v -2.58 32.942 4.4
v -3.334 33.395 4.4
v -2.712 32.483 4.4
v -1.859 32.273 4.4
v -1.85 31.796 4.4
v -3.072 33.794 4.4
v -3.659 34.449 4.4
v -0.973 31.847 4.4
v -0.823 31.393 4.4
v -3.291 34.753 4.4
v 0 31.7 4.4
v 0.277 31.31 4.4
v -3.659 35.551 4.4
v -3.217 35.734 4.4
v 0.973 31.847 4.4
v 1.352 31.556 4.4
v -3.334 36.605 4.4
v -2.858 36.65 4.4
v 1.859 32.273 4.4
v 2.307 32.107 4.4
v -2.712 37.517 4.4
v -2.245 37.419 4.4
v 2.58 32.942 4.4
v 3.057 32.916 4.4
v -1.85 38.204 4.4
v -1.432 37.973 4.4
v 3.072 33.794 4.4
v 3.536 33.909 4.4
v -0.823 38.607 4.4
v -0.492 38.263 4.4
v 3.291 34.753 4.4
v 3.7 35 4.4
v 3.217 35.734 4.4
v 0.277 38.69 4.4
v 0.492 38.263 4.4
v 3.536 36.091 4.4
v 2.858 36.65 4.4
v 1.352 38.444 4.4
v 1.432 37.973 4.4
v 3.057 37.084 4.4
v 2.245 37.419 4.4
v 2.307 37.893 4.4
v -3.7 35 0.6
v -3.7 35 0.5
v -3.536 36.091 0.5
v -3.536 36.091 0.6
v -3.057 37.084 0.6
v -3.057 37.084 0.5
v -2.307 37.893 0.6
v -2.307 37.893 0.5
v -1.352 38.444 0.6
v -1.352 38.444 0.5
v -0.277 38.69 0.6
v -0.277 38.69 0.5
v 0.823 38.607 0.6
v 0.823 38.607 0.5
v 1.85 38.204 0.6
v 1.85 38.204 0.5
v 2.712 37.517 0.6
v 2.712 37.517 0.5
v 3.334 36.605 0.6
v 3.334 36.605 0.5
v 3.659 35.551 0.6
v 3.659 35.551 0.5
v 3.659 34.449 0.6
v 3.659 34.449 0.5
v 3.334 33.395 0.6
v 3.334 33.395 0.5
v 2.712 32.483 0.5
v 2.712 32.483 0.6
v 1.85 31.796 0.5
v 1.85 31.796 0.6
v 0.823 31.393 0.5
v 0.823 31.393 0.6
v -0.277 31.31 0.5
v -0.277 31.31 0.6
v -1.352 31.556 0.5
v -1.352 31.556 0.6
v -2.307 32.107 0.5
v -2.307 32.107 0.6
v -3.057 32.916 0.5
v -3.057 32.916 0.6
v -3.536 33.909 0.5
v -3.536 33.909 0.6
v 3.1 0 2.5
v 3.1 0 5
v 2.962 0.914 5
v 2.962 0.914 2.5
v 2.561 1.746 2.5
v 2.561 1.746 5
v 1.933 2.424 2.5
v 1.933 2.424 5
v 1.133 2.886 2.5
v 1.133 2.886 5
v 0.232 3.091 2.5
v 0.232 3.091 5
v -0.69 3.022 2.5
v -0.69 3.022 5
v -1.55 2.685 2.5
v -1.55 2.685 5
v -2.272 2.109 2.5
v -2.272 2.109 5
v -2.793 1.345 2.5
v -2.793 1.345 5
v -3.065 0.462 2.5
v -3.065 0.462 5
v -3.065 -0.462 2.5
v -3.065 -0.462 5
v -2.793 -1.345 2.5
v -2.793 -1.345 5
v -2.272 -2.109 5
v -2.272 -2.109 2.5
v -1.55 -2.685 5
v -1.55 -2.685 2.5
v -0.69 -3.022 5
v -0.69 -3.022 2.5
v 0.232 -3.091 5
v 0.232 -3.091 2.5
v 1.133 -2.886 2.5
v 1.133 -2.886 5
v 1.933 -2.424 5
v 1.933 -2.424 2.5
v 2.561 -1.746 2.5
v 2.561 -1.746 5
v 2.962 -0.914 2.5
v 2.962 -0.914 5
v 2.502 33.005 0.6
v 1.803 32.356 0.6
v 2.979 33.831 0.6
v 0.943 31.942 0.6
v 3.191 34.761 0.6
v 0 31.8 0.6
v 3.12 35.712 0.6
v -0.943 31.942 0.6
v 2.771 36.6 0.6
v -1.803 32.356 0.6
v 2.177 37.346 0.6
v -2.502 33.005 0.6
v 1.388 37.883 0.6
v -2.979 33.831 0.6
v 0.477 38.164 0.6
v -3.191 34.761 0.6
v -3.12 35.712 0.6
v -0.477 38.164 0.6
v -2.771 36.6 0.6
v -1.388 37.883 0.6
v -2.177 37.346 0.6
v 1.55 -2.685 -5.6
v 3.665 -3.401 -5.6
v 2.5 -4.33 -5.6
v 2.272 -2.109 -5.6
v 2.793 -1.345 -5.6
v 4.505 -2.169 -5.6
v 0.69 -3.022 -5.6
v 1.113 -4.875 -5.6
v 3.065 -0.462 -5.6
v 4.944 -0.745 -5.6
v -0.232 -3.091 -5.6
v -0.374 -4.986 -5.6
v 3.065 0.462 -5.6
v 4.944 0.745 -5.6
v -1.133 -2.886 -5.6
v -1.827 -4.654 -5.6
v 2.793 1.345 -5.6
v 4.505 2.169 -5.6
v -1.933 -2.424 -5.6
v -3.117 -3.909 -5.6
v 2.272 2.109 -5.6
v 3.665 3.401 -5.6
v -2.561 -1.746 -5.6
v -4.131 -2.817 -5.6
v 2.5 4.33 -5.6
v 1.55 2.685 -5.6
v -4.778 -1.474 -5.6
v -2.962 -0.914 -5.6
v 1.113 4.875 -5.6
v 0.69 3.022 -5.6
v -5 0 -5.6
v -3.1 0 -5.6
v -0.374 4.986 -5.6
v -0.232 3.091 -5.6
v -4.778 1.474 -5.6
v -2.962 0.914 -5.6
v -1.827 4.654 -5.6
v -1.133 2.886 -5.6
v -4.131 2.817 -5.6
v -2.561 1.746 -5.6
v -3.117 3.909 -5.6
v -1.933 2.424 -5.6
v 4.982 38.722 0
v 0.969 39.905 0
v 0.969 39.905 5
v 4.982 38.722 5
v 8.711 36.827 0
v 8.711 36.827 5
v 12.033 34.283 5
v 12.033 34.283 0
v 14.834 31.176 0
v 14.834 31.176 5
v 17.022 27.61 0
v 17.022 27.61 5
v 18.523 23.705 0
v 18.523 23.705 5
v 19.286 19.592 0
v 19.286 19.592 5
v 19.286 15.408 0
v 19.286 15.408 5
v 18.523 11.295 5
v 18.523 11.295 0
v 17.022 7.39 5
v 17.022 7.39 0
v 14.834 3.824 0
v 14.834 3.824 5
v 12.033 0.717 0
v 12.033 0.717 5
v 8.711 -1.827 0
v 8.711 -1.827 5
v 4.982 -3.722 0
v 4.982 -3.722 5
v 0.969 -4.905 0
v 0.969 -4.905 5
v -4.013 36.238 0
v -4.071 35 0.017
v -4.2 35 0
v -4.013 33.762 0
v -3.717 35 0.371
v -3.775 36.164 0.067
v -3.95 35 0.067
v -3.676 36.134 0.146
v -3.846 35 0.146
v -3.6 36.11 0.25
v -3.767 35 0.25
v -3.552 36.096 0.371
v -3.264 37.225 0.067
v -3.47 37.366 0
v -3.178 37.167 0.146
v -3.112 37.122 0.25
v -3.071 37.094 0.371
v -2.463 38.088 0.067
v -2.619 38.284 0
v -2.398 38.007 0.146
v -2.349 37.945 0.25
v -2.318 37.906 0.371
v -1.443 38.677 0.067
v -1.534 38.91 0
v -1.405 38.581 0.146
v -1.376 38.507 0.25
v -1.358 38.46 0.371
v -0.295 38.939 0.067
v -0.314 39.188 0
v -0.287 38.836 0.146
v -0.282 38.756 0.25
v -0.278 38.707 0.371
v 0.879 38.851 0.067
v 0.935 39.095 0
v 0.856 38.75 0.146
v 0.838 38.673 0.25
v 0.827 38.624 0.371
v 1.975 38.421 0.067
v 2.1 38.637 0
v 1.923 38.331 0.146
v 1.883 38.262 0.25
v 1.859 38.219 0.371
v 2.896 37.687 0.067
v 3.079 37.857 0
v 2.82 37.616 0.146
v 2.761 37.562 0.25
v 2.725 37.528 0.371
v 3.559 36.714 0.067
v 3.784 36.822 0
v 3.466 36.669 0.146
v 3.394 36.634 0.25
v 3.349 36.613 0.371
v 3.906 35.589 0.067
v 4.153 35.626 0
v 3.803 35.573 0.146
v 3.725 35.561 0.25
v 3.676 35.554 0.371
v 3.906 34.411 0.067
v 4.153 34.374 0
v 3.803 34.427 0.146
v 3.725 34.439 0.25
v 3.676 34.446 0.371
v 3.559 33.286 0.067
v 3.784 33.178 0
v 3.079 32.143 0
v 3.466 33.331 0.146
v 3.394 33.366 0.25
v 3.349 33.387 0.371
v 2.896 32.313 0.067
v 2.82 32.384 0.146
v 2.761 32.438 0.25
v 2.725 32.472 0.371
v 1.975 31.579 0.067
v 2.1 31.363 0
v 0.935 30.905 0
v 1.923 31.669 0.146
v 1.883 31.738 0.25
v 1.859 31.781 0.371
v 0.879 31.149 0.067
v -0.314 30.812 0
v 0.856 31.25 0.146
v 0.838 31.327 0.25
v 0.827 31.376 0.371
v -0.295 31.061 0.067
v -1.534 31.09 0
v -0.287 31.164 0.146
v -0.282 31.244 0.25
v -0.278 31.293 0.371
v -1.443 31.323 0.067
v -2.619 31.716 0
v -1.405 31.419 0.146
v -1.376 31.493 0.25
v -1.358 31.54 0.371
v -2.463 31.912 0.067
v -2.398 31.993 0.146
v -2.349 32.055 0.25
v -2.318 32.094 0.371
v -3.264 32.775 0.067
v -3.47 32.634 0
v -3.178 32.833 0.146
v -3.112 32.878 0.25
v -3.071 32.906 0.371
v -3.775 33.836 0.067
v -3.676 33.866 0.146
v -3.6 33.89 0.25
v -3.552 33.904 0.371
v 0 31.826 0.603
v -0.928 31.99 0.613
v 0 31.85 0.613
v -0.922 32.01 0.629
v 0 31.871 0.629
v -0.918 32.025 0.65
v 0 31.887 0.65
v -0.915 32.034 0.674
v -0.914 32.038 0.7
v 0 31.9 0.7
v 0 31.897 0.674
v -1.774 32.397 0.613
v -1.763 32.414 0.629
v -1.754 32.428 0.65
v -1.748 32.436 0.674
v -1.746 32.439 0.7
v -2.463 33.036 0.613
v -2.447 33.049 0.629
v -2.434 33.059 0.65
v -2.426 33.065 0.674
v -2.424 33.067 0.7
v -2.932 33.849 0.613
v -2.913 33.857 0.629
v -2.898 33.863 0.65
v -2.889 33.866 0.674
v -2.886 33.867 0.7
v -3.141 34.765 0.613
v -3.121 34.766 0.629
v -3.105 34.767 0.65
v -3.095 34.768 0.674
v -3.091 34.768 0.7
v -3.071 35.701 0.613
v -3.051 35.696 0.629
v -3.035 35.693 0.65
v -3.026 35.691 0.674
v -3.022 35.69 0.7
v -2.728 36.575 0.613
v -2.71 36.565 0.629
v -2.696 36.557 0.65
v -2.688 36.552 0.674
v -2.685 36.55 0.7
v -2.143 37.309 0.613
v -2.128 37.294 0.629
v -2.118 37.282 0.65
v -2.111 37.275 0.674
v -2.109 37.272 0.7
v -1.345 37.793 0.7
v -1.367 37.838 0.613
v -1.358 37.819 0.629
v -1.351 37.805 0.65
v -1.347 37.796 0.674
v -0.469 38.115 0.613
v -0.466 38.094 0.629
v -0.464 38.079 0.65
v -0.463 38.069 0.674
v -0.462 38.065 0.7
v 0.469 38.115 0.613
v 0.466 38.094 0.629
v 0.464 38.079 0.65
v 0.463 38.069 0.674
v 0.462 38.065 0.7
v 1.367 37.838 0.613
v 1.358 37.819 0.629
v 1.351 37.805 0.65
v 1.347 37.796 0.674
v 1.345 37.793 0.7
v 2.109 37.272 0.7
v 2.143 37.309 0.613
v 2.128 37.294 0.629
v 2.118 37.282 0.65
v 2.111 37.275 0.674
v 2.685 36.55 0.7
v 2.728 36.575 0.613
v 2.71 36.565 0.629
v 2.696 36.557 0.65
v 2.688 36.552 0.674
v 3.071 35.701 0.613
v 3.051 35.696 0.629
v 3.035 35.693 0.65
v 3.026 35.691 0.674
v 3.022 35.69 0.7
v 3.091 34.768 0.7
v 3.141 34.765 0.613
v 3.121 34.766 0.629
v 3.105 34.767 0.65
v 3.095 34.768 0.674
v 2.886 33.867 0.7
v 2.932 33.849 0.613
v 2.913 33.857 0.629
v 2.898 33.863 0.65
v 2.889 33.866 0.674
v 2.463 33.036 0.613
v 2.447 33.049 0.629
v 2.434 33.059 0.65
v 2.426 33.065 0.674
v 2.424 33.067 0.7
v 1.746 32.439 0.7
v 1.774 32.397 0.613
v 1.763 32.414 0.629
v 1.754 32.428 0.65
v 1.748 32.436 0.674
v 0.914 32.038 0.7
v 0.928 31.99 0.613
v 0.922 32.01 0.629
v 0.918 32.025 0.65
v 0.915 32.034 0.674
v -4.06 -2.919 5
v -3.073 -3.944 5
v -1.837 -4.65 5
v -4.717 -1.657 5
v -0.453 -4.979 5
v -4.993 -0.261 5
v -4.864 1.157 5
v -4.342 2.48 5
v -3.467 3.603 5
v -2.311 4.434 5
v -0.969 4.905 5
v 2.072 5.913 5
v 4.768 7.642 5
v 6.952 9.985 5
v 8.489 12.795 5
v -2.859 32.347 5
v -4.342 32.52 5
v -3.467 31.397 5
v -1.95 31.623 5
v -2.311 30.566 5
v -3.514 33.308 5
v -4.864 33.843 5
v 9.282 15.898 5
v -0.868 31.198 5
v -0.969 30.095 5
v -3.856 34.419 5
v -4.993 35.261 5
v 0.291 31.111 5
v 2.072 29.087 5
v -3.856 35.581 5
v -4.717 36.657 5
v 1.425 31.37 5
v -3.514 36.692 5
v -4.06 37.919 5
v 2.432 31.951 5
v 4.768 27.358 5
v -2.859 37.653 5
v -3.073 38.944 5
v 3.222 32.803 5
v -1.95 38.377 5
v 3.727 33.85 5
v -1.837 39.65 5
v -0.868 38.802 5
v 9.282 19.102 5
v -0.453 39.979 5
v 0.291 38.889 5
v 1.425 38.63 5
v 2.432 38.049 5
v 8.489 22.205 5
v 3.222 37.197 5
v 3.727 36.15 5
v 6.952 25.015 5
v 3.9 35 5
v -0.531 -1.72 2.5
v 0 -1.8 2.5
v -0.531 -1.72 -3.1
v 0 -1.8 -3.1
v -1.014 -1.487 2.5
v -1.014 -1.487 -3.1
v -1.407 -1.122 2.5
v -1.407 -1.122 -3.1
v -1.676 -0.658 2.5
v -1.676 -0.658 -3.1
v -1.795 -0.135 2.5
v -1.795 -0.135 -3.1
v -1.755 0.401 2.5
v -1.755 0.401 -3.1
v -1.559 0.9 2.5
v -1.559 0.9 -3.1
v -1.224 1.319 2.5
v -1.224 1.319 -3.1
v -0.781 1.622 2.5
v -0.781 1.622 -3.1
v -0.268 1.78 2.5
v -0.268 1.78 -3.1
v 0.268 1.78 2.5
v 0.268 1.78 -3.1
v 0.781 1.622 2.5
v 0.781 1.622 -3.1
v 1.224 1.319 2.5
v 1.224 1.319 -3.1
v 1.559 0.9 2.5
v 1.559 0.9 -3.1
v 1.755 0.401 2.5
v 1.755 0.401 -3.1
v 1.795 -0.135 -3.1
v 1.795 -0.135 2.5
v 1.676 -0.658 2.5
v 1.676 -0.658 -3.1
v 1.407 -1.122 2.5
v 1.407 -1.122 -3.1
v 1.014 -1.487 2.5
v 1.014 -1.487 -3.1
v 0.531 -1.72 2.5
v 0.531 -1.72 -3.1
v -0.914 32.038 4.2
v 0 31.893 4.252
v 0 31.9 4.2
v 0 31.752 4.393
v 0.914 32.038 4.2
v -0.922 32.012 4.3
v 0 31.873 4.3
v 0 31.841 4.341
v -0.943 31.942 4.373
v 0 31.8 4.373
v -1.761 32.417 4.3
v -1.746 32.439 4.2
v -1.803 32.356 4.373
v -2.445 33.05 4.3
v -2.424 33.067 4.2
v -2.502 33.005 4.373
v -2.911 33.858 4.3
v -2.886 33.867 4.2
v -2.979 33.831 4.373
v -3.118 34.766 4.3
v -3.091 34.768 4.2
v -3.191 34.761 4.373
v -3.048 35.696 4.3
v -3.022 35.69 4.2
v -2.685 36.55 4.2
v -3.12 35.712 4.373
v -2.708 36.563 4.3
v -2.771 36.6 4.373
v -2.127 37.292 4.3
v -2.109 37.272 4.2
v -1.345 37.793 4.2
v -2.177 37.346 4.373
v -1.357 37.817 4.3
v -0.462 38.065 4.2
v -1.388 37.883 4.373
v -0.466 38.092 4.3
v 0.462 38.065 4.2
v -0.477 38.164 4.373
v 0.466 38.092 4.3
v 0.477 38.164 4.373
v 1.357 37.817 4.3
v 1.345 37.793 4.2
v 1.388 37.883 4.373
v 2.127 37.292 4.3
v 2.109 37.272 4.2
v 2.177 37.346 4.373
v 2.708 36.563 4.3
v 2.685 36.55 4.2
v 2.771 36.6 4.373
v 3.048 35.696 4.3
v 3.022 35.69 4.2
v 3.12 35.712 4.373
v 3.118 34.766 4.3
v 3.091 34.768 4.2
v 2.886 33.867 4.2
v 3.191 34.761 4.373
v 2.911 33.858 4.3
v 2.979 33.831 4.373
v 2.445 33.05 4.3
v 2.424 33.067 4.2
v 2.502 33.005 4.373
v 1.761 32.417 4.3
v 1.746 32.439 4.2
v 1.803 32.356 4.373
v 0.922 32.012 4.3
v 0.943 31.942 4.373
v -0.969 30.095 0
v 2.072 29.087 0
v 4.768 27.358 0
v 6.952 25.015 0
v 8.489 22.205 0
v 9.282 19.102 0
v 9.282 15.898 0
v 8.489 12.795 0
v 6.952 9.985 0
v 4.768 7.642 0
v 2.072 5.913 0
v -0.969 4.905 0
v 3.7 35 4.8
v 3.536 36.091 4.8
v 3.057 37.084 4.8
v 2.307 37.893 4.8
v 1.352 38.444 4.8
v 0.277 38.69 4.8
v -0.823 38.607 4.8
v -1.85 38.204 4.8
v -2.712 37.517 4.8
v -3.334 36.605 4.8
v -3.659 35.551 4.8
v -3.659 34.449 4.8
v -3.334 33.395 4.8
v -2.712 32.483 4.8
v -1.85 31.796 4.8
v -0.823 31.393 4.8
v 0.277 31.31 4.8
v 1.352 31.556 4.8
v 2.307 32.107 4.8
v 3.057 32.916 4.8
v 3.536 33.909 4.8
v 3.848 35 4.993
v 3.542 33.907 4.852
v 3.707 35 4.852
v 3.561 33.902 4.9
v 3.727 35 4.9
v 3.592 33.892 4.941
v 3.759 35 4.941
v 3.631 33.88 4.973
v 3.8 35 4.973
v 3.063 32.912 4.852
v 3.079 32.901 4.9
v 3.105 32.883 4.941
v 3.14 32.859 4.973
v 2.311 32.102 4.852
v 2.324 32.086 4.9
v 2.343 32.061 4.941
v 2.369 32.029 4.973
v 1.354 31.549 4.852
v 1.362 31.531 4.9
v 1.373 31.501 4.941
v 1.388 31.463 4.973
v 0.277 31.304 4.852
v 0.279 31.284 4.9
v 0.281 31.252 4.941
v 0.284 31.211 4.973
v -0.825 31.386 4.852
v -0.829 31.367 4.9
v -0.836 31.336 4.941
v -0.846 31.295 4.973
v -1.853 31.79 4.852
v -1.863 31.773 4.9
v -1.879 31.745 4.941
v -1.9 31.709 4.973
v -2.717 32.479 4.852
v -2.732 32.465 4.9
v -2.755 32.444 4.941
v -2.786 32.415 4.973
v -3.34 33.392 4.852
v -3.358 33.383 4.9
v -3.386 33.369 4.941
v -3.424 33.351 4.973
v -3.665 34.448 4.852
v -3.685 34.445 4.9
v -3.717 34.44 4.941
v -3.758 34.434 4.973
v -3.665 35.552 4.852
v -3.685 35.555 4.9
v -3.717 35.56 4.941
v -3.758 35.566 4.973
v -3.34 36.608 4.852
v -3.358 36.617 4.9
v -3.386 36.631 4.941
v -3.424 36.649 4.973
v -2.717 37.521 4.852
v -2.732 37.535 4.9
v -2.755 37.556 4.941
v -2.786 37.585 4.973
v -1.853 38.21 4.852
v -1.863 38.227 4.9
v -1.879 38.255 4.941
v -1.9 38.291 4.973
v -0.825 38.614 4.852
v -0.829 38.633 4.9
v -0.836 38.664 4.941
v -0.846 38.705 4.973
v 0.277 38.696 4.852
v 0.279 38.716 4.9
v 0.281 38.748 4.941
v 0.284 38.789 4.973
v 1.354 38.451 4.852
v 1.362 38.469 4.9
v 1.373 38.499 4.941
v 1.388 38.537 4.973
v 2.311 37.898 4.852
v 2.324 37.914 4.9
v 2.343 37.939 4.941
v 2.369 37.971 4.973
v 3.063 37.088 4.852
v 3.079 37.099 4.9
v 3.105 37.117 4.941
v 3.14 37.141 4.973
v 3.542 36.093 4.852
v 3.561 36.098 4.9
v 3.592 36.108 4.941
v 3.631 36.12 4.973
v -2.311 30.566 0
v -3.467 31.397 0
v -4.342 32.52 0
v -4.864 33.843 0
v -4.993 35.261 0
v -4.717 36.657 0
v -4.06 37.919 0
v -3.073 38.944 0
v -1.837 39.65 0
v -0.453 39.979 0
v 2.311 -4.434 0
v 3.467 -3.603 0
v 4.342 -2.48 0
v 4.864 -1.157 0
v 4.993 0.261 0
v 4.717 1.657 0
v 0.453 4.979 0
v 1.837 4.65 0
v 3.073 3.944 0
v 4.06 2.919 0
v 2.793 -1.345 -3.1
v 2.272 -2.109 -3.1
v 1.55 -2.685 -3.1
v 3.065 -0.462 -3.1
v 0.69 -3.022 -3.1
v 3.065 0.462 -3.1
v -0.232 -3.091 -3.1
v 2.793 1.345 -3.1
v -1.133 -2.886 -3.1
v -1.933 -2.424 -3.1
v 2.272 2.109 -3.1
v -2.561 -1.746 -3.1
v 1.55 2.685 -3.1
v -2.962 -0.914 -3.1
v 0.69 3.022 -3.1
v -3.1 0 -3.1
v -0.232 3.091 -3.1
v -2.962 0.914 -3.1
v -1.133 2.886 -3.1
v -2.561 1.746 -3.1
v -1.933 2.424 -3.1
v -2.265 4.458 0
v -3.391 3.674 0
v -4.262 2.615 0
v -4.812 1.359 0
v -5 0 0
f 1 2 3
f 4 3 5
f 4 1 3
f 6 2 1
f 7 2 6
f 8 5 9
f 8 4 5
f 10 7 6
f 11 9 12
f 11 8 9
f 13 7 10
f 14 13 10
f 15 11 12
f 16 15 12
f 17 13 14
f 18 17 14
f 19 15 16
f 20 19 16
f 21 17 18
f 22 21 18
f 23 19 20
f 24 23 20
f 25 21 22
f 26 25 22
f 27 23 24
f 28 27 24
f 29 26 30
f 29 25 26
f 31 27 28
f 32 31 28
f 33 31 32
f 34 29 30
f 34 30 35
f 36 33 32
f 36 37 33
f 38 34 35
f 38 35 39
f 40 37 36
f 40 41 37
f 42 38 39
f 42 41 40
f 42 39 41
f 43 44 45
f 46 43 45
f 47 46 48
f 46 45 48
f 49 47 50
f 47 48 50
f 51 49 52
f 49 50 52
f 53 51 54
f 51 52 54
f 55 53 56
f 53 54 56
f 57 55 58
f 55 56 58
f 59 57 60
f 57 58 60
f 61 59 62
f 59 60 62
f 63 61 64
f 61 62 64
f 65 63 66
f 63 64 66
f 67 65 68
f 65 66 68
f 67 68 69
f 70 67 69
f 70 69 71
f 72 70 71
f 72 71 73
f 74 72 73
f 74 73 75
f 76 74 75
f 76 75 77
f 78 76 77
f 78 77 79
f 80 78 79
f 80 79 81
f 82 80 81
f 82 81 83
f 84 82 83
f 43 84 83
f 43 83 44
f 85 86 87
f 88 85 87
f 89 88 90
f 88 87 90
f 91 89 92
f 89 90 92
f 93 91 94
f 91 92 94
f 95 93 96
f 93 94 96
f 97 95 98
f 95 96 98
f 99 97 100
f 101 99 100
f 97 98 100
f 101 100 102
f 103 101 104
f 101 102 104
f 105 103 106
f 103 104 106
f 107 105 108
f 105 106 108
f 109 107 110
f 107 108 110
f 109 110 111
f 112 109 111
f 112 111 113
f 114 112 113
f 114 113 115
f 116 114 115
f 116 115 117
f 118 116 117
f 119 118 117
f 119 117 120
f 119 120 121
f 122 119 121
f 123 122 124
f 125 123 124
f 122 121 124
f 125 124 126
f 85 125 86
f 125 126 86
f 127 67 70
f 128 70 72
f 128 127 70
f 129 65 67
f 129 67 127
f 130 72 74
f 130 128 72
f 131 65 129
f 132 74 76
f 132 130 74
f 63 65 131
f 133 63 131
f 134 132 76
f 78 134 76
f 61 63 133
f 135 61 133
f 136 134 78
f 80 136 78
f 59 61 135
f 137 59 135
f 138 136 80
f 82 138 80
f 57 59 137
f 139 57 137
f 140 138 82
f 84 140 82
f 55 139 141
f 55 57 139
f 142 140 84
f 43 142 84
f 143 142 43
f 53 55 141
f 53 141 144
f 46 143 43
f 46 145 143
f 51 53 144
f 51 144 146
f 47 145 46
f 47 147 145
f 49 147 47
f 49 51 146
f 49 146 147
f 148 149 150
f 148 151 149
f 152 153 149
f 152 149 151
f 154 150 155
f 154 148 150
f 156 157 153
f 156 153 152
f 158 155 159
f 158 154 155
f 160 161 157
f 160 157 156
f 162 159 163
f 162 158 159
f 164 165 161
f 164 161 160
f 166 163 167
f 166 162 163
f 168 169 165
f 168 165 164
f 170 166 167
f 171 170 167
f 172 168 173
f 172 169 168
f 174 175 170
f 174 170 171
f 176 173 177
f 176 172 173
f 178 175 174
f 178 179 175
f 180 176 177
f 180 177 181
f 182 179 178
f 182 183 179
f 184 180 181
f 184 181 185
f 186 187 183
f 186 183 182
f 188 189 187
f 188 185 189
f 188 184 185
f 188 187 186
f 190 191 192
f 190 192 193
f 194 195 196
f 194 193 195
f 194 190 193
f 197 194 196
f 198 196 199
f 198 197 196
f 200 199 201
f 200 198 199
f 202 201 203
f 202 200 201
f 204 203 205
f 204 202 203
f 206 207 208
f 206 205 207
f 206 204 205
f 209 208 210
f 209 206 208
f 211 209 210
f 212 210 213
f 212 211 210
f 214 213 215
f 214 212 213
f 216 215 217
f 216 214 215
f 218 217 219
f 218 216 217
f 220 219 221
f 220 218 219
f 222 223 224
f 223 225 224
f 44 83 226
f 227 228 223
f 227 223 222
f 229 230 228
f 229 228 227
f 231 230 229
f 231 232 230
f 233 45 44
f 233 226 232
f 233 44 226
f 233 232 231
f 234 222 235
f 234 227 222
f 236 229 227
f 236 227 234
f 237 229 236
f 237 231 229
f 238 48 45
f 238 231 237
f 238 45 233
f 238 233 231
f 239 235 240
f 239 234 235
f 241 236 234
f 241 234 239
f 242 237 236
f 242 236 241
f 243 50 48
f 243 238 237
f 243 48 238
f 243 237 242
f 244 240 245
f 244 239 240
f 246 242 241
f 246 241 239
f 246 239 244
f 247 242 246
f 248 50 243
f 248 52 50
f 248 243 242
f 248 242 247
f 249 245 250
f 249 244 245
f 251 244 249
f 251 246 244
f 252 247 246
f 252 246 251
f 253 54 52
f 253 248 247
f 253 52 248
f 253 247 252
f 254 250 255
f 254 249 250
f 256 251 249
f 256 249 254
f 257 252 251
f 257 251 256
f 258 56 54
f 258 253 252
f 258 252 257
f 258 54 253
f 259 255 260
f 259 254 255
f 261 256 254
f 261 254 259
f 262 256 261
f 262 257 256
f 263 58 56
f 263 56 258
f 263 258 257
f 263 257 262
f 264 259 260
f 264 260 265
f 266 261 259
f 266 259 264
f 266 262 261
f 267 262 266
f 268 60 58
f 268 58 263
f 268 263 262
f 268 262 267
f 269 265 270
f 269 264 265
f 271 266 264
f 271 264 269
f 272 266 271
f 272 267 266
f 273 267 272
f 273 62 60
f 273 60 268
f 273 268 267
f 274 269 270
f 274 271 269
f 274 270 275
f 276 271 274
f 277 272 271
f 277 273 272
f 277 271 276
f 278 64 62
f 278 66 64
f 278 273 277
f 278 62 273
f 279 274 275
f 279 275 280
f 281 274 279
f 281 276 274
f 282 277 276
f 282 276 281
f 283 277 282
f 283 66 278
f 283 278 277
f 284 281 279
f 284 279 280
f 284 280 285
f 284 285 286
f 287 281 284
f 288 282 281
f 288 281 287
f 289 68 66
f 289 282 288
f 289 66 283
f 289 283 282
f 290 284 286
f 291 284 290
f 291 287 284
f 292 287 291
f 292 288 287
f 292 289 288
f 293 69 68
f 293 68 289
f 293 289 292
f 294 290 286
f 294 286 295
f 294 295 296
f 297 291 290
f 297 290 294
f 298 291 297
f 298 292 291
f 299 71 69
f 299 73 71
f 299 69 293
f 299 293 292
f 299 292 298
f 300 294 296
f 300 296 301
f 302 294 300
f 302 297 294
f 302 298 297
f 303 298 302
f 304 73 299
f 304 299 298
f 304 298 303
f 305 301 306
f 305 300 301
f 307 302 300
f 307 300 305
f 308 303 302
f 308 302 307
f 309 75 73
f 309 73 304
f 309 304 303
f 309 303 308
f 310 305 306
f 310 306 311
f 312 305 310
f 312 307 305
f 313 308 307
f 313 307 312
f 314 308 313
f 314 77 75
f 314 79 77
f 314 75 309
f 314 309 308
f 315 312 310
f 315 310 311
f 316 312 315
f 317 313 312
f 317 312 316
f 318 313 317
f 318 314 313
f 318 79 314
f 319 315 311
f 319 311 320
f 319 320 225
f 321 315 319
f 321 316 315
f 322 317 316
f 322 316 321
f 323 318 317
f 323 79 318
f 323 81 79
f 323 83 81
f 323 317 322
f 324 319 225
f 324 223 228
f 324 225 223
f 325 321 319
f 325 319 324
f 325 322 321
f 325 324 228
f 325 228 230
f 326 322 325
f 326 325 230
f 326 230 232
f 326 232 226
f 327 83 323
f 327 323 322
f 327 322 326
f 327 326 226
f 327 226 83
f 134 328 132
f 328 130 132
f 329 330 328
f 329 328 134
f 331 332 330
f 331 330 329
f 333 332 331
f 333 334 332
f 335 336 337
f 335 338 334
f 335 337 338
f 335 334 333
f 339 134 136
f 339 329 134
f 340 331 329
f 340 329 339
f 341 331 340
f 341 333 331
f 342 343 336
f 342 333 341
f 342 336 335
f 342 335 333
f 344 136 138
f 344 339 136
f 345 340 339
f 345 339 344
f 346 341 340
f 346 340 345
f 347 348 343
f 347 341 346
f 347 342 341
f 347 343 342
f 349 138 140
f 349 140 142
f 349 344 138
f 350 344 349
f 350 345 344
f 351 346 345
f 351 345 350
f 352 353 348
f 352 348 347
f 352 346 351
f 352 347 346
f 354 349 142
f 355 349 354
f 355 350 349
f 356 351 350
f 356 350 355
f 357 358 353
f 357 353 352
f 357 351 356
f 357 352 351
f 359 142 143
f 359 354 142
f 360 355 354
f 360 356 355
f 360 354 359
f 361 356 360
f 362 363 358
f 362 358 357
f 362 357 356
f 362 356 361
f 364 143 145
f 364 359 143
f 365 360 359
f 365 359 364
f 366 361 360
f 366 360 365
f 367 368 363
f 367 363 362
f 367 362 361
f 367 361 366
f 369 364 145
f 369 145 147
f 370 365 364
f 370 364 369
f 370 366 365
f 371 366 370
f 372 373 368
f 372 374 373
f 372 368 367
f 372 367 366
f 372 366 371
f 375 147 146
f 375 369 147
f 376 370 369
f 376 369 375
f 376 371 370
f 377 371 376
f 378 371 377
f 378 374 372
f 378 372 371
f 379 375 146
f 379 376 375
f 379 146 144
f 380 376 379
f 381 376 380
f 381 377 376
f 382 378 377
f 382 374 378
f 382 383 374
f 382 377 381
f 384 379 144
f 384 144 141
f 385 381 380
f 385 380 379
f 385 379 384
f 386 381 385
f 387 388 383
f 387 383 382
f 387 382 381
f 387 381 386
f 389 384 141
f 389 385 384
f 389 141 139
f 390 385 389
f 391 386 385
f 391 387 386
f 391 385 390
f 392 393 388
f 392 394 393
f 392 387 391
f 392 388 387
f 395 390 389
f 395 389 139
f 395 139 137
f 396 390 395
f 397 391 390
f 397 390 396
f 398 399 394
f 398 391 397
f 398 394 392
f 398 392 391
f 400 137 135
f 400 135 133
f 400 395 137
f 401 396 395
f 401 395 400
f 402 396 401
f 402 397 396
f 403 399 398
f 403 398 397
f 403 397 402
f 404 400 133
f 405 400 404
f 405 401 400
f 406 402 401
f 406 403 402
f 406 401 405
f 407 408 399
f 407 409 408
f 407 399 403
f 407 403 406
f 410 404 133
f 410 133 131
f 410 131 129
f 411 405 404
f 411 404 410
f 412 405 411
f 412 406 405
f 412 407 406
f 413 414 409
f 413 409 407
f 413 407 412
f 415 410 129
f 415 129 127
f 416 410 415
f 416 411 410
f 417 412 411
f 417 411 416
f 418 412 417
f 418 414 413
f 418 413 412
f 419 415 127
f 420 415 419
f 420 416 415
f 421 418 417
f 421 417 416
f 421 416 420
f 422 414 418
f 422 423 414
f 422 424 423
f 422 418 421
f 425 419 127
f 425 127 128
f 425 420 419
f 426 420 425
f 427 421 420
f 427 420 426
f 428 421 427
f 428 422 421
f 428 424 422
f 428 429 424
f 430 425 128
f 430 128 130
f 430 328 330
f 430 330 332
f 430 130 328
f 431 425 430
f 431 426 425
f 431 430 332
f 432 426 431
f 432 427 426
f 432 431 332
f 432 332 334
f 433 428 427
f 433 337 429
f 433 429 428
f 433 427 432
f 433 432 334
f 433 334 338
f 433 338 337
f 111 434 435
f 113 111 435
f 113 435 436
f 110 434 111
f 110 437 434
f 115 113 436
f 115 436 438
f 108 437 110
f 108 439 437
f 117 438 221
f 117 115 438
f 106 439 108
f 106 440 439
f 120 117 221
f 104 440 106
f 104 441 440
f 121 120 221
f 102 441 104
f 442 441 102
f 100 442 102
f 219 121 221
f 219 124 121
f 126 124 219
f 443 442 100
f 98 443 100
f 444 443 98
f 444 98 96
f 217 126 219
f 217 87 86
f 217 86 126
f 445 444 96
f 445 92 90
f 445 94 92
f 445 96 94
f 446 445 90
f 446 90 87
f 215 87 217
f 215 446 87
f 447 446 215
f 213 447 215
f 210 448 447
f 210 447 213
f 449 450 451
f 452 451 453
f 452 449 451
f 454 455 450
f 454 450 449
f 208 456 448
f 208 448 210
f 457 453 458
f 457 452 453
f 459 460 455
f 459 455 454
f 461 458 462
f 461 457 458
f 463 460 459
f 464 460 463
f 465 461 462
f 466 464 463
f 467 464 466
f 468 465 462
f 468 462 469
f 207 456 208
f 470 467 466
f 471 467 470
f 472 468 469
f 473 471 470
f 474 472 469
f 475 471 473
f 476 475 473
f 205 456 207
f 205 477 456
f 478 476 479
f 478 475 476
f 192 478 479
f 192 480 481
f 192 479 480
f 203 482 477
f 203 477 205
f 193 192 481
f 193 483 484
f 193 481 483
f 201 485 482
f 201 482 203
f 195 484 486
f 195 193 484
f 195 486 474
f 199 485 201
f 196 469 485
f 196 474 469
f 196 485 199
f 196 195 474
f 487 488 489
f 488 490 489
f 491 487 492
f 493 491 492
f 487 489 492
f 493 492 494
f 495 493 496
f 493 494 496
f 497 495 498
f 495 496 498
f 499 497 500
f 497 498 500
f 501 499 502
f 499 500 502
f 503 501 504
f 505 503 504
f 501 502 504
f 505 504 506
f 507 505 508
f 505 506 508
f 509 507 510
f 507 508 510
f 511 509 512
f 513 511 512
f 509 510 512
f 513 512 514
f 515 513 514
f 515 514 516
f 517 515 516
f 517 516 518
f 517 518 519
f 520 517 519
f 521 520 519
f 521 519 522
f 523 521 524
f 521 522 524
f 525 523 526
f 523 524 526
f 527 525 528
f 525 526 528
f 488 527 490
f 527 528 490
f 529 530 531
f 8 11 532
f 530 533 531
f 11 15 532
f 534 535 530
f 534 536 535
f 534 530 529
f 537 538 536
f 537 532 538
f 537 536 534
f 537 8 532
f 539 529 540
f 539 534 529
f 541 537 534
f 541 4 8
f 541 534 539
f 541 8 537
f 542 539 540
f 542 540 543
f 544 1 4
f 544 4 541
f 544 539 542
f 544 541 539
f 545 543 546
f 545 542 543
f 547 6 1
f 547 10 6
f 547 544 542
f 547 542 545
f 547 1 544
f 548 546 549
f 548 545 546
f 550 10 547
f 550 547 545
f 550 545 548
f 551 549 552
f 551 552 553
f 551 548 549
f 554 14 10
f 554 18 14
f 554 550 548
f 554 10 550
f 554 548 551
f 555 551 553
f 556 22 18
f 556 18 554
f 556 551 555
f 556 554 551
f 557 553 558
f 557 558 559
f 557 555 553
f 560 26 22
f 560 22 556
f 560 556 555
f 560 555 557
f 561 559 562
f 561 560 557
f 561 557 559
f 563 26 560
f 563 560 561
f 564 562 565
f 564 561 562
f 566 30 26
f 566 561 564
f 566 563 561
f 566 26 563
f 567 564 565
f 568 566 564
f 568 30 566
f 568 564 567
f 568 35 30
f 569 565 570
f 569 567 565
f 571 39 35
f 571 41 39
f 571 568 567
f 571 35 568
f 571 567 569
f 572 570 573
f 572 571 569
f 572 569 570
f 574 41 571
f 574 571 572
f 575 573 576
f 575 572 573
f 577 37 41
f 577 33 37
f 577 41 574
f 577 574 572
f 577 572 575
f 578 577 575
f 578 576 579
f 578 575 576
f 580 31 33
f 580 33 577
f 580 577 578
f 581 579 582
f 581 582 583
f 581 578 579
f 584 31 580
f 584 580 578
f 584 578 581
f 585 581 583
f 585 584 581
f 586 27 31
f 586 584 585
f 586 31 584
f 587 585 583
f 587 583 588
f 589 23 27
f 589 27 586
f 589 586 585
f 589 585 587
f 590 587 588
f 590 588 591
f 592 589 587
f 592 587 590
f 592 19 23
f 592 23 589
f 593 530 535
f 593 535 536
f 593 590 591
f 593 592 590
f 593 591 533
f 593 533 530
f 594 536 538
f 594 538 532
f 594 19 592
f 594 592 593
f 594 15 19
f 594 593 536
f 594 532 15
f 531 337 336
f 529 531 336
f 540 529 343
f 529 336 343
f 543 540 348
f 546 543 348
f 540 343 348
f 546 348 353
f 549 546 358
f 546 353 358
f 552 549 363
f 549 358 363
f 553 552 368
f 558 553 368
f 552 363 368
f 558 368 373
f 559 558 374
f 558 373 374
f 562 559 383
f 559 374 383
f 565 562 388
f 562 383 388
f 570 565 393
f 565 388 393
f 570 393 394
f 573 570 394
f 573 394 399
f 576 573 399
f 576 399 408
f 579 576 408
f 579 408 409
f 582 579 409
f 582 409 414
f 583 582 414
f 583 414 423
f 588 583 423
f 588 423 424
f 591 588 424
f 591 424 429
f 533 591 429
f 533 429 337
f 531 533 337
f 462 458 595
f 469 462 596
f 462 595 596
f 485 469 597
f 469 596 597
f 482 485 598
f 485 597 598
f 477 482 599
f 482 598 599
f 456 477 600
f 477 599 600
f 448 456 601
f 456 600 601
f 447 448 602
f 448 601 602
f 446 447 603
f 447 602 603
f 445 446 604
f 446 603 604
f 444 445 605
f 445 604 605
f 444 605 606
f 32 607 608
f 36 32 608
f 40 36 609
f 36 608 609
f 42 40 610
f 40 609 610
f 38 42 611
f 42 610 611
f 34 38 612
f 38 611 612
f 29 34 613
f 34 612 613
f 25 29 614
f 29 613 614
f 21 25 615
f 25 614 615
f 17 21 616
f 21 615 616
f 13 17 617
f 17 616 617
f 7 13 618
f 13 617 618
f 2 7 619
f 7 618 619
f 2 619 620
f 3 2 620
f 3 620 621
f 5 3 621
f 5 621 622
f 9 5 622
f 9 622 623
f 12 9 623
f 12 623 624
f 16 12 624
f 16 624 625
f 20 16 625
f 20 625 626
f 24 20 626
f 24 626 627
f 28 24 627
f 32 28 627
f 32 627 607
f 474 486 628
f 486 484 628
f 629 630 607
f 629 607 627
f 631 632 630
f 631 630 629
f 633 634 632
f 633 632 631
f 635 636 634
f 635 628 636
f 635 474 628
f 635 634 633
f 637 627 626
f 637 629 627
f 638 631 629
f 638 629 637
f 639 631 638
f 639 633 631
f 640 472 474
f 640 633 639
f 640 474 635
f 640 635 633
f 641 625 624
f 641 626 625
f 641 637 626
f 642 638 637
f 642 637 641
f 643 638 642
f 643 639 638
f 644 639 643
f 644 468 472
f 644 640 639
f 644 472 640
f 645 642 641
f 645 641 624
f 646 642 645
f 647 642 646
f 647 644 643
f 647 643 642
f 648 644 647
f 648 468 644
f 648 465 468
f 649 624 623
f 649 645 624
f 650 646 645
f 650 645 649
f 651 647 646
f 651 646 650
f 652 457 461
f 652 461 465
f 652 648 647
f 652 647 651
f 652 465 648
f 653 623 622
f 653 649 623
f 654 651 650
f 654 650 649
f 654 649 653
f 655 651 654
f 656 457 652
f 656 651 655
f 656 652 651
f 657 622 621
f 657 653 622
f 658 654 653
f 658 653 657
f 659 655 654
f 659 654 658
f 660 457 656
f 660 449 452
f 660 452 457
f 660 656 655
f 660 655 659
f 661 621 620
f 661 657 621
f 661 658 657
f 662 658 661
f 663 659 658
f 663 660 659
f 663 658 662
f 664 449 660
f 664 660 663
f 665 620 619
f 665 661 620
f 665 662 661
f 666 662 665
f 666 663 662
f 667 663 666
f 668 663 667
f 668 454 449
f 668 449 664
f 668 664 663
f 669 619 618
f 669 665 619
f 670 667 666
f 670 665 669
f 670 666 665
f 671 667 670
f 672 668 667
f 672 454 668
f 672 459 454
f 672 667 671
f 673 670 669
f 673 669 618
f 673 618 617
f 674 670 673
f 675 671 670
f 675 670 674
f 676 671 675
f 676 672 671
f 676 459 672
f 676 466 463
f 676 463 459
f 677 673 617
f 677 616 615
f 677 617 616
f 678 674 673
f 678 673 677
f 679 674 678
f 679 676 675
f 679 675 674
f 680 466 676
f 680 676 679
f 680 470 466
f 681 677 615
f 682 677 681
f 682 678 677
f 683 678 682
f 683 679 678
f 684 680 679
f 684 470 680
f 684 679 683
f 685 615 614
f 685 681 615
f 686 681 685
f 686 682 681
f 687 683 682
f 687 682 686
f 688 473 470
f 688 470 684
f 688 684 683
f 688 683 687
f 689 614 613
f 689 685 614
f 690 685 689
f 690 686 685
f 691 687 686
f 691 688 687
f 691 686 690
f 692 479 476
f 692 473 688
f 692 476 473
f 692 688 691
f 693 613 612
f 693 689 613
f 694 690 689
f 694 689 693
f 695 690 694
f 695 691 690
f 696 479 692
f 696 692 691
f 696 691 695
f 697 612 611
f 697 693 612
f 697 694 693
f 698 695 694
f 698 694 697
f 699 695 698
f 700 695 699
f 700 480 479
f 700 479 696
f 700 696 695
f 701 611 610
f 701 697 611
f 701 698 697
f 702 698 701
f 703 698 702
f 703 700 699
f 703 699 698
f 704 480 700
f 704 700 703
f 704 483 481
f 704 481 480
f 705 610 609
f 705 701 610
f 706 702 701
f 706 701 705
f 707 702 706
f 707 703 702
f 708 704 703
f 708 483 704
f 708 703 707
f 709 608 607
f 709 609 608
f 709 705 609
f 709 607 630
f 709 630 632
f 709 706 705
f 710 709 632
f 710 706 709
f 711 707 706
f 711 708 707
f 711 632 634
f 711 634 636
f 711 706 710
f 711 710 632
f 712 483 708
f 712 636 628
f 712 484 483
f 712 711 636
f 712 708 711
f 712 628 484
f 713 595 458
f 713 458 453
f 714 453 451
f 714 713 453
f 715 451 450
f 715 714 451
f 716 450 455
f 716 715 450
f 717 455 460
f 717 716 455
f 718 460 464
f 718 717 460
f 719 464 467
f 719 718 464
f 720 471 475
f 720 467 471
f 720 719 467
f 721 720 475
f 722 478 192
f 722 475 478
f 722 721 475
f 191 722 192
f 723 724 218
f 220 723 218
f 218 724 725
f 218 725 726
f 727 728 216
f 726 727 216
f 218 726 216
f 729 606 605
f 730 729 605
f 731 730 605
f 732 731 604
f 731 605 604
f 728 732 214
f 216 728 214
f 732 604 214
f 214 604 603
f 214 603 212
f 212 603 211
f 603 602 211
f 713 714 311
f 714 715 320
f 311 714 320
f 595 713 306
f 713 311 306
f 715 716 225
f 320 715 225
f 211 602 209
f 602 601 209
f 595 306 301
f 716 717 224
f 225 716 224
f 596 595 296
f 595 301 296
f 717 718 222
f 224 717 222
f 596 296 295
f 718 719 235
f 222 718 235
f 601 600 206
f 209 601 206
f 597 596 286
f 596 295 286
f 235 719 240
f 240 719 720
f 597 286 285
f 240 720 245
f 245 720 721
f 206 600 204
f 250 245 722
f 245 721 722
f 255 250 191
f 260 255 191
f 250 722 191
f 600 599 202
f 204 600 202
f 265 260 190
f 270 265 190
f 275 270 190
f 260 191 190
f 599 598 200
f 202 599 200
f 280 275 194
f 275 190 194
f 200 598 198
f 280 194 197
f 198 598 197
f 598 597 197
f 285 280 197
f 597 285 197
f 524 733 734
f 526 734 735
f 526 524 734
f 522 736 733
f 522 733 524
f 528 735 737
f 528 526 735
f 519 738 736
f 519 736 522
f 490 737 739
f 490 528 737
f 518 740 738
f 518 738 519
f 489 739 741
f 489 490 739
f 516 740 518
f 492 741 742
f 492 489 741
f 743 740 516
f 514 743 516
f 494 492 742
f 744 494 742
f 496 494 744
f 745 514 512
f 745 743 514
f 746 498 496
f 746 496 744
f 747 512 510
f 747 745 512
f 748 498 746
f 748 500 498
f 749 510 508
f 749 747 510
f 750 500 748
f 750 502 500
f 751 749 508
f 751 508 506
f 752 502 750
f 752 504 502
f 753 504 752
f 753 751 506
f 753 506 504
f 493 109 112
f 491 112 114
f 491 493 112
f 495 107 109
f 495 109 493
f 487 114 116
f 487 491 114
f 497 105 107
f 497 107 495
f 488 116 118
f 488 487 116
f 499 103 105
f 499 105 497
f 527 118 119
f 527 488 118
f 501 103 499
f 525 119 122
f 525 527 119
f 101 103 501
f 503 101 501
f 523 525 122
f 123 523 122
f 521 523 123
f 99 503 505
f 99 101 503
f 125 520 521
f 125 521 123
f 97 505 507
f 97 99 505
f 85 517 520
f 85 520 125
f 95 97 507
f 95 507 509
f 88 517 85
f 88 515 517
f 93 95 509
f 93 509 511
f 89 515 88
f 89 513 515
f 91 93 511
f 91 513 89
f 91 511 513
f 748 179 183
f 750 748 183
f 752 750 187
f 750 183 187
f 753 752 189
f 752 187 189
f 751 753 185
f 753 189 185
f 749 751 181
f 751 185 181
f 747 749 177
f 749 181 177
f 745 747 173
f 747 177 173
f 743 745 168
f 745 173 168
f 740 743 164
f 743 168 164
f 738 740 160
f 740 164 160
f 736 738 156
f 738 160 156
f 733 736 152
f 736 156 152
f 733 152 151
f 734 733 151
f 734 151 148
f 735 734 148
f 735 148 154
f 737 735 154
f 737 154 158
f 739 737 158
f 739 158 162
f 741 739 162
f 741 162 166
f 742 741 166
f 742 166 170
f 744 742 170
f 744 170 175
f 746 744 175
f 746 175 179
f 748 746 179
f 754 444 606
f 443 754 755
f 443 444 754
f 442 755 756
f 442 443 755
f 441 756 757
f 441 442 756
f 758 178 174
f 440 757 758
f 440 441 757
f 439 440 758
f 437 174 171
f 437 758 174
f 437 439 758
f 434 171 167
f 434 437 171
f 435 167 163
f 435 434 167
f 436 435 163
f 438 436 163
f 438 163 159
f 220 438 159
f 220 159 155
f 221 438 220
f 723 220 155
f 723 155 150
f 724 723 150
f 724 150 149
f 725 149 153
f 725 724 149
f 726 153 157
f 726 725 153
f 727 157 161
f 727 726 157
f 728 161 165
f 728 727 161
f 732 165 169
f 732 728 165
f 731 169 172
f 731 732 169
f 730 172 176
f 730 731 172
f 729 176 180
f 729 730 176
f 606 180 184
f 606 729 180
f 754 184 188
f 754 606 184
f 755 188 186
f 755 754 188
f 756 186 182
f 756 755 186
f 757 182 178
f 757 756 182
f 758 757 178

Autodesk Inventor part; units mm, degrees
ref_plane "YZ Plane" through (0, 0, 0) normal (1, 0, 0) x (0, 1, 0)
ref_plane "XZ Plane" through (0, 0, 0) normal (0, 1, 0) x (-1, 0, 0)
ref_plane "XY Plane" through (0, 0, 0) normal (0, 0, 1) x (1, 0, 0)
sketch "スケッチ1" plane through (0, 0, 0) normal (0, 0, 1) x (1, 0, 0)
  circle A0 centre (0, 0) radius 5
  circle A1 centre (0, 35) radius 5
  line L0 (0, 35) -> (0, 0)
  arc A2 (0.9687, -4.9053) -> (0.9687, 39.9053) centre (-3.456, 17.5) ccw
  arc A3 (-0.9687, 4.9053) -> (-0.9687, 30.0947) centre (-3.456, 17.5) ccw
  point P0 (0, 30)
  point P1 (0, 29.8641)
  point P2 (0, 5.1359)
  point P3 (0, 5)
  dimension "d0" = 10
  dimension "d1" = 10
  dimension "d2" = 35
  dimension "d3" = 22.838
  dimension "d4" = 12.838
extrude "押し出し1" add sketch "スケッチ1" along normal blind 5 contours A0 | A3 L0 A0 | A0 L0 A3 A1 A2 | A1 | A3 A1 L0
sketch "スケッチ2" plane through (0, 0, 0) normal (0, 0, -1) x (-1, 0, 0)
  circle A0 centre (0, 0) radius 5
extrude "押し出し2" add sketch "スケッチ2" along normal blind 5.6
sketch "スケッチ3" plane through (0, 0, -5.6) normal (0, 0, -1) x (-1, 0, 0)
  circle A0 centre (0, 0) radius 3.1
  dimension "d9" = 6.2
extrude "押し出し3" cut sketch "スケッチ3" against normal blind 2.5
sketch "スケッチ4" plane through (0, 0, 5) normal (0, 0, 1) x (1, 0, 0)
  circle A0 centre (0, 0) radius 3.1 projected
  arc A1 (0.9687, 39.9053) -> (-0.9687, 30.0947) centre (0, 35) ccw projected
  point P0 (0, 30)
hole "穴1" at (0, 0, 5) at (0, 35, 5) direction (0, 0, -1) diameter 3.6 end through all
sketch "スケッチ5" plane through (0, 0, 0) normal (0, 0, -1) x (-1, 0, 0)
  circle A0 centre (0, 35) radius 1.8 projected
  circle A1 centre (0, 35) radius 3.7
  point P0 (0, 0)
  dimension "d19" = 7.4
extrude "押し出し4" cut sketch "スケッチ5" against normal blind 0.6
sketch "スケッチ7" plane through (0, 0, 5) normal (0, 0, 1) x (1, 0, 0)
  circle A0 centre (0, 35) radius 1.8 projected
  point P0 (0, 0)
hole "穴3" at (0, 35, 5) direction (0, 0, -1) diameter 6.2 end through all
fillet "フィレット2" radius 0.5 1 edges at (3.7, 35, 0)
fillet "フィレット3" radius 0.1 1 edges at (0, 38.1, 0.6)
sketch "スケッチ8" plane through (0, 0, 5) normal (0, 0, 1) x (1, 0, 0)
  circle A0 centre (0, 0) radius 1.8 projected
  circle A1 centre (0, 0) radius 3.1
  dimension "d39" = 6.2
extrude "押し出し5" cut sketch "スケッチ8" against normal blind 2.5
sketch "スケッチ10" plane through (0, 0, 5) normal (0, 0, 1) x (1, 0, 0)
  circle A0 centre (0, 35) radius 3.1 projected
  circle A1 centre (0, 35) radius 3.7
  point P0 (0, 0)
  dimension "d45" = 7.4
extrude "押し出し7" cut sketch "スケッチ10" against normal blind 0.6 contours A0 | A1
fillet "フィレット4" radius 0.2 2 edges at (0, 38.1, 4.4) (-3.7, 35, 5)
properties part number "rotor_arm_ver2" material "アルミニウム 6061"
